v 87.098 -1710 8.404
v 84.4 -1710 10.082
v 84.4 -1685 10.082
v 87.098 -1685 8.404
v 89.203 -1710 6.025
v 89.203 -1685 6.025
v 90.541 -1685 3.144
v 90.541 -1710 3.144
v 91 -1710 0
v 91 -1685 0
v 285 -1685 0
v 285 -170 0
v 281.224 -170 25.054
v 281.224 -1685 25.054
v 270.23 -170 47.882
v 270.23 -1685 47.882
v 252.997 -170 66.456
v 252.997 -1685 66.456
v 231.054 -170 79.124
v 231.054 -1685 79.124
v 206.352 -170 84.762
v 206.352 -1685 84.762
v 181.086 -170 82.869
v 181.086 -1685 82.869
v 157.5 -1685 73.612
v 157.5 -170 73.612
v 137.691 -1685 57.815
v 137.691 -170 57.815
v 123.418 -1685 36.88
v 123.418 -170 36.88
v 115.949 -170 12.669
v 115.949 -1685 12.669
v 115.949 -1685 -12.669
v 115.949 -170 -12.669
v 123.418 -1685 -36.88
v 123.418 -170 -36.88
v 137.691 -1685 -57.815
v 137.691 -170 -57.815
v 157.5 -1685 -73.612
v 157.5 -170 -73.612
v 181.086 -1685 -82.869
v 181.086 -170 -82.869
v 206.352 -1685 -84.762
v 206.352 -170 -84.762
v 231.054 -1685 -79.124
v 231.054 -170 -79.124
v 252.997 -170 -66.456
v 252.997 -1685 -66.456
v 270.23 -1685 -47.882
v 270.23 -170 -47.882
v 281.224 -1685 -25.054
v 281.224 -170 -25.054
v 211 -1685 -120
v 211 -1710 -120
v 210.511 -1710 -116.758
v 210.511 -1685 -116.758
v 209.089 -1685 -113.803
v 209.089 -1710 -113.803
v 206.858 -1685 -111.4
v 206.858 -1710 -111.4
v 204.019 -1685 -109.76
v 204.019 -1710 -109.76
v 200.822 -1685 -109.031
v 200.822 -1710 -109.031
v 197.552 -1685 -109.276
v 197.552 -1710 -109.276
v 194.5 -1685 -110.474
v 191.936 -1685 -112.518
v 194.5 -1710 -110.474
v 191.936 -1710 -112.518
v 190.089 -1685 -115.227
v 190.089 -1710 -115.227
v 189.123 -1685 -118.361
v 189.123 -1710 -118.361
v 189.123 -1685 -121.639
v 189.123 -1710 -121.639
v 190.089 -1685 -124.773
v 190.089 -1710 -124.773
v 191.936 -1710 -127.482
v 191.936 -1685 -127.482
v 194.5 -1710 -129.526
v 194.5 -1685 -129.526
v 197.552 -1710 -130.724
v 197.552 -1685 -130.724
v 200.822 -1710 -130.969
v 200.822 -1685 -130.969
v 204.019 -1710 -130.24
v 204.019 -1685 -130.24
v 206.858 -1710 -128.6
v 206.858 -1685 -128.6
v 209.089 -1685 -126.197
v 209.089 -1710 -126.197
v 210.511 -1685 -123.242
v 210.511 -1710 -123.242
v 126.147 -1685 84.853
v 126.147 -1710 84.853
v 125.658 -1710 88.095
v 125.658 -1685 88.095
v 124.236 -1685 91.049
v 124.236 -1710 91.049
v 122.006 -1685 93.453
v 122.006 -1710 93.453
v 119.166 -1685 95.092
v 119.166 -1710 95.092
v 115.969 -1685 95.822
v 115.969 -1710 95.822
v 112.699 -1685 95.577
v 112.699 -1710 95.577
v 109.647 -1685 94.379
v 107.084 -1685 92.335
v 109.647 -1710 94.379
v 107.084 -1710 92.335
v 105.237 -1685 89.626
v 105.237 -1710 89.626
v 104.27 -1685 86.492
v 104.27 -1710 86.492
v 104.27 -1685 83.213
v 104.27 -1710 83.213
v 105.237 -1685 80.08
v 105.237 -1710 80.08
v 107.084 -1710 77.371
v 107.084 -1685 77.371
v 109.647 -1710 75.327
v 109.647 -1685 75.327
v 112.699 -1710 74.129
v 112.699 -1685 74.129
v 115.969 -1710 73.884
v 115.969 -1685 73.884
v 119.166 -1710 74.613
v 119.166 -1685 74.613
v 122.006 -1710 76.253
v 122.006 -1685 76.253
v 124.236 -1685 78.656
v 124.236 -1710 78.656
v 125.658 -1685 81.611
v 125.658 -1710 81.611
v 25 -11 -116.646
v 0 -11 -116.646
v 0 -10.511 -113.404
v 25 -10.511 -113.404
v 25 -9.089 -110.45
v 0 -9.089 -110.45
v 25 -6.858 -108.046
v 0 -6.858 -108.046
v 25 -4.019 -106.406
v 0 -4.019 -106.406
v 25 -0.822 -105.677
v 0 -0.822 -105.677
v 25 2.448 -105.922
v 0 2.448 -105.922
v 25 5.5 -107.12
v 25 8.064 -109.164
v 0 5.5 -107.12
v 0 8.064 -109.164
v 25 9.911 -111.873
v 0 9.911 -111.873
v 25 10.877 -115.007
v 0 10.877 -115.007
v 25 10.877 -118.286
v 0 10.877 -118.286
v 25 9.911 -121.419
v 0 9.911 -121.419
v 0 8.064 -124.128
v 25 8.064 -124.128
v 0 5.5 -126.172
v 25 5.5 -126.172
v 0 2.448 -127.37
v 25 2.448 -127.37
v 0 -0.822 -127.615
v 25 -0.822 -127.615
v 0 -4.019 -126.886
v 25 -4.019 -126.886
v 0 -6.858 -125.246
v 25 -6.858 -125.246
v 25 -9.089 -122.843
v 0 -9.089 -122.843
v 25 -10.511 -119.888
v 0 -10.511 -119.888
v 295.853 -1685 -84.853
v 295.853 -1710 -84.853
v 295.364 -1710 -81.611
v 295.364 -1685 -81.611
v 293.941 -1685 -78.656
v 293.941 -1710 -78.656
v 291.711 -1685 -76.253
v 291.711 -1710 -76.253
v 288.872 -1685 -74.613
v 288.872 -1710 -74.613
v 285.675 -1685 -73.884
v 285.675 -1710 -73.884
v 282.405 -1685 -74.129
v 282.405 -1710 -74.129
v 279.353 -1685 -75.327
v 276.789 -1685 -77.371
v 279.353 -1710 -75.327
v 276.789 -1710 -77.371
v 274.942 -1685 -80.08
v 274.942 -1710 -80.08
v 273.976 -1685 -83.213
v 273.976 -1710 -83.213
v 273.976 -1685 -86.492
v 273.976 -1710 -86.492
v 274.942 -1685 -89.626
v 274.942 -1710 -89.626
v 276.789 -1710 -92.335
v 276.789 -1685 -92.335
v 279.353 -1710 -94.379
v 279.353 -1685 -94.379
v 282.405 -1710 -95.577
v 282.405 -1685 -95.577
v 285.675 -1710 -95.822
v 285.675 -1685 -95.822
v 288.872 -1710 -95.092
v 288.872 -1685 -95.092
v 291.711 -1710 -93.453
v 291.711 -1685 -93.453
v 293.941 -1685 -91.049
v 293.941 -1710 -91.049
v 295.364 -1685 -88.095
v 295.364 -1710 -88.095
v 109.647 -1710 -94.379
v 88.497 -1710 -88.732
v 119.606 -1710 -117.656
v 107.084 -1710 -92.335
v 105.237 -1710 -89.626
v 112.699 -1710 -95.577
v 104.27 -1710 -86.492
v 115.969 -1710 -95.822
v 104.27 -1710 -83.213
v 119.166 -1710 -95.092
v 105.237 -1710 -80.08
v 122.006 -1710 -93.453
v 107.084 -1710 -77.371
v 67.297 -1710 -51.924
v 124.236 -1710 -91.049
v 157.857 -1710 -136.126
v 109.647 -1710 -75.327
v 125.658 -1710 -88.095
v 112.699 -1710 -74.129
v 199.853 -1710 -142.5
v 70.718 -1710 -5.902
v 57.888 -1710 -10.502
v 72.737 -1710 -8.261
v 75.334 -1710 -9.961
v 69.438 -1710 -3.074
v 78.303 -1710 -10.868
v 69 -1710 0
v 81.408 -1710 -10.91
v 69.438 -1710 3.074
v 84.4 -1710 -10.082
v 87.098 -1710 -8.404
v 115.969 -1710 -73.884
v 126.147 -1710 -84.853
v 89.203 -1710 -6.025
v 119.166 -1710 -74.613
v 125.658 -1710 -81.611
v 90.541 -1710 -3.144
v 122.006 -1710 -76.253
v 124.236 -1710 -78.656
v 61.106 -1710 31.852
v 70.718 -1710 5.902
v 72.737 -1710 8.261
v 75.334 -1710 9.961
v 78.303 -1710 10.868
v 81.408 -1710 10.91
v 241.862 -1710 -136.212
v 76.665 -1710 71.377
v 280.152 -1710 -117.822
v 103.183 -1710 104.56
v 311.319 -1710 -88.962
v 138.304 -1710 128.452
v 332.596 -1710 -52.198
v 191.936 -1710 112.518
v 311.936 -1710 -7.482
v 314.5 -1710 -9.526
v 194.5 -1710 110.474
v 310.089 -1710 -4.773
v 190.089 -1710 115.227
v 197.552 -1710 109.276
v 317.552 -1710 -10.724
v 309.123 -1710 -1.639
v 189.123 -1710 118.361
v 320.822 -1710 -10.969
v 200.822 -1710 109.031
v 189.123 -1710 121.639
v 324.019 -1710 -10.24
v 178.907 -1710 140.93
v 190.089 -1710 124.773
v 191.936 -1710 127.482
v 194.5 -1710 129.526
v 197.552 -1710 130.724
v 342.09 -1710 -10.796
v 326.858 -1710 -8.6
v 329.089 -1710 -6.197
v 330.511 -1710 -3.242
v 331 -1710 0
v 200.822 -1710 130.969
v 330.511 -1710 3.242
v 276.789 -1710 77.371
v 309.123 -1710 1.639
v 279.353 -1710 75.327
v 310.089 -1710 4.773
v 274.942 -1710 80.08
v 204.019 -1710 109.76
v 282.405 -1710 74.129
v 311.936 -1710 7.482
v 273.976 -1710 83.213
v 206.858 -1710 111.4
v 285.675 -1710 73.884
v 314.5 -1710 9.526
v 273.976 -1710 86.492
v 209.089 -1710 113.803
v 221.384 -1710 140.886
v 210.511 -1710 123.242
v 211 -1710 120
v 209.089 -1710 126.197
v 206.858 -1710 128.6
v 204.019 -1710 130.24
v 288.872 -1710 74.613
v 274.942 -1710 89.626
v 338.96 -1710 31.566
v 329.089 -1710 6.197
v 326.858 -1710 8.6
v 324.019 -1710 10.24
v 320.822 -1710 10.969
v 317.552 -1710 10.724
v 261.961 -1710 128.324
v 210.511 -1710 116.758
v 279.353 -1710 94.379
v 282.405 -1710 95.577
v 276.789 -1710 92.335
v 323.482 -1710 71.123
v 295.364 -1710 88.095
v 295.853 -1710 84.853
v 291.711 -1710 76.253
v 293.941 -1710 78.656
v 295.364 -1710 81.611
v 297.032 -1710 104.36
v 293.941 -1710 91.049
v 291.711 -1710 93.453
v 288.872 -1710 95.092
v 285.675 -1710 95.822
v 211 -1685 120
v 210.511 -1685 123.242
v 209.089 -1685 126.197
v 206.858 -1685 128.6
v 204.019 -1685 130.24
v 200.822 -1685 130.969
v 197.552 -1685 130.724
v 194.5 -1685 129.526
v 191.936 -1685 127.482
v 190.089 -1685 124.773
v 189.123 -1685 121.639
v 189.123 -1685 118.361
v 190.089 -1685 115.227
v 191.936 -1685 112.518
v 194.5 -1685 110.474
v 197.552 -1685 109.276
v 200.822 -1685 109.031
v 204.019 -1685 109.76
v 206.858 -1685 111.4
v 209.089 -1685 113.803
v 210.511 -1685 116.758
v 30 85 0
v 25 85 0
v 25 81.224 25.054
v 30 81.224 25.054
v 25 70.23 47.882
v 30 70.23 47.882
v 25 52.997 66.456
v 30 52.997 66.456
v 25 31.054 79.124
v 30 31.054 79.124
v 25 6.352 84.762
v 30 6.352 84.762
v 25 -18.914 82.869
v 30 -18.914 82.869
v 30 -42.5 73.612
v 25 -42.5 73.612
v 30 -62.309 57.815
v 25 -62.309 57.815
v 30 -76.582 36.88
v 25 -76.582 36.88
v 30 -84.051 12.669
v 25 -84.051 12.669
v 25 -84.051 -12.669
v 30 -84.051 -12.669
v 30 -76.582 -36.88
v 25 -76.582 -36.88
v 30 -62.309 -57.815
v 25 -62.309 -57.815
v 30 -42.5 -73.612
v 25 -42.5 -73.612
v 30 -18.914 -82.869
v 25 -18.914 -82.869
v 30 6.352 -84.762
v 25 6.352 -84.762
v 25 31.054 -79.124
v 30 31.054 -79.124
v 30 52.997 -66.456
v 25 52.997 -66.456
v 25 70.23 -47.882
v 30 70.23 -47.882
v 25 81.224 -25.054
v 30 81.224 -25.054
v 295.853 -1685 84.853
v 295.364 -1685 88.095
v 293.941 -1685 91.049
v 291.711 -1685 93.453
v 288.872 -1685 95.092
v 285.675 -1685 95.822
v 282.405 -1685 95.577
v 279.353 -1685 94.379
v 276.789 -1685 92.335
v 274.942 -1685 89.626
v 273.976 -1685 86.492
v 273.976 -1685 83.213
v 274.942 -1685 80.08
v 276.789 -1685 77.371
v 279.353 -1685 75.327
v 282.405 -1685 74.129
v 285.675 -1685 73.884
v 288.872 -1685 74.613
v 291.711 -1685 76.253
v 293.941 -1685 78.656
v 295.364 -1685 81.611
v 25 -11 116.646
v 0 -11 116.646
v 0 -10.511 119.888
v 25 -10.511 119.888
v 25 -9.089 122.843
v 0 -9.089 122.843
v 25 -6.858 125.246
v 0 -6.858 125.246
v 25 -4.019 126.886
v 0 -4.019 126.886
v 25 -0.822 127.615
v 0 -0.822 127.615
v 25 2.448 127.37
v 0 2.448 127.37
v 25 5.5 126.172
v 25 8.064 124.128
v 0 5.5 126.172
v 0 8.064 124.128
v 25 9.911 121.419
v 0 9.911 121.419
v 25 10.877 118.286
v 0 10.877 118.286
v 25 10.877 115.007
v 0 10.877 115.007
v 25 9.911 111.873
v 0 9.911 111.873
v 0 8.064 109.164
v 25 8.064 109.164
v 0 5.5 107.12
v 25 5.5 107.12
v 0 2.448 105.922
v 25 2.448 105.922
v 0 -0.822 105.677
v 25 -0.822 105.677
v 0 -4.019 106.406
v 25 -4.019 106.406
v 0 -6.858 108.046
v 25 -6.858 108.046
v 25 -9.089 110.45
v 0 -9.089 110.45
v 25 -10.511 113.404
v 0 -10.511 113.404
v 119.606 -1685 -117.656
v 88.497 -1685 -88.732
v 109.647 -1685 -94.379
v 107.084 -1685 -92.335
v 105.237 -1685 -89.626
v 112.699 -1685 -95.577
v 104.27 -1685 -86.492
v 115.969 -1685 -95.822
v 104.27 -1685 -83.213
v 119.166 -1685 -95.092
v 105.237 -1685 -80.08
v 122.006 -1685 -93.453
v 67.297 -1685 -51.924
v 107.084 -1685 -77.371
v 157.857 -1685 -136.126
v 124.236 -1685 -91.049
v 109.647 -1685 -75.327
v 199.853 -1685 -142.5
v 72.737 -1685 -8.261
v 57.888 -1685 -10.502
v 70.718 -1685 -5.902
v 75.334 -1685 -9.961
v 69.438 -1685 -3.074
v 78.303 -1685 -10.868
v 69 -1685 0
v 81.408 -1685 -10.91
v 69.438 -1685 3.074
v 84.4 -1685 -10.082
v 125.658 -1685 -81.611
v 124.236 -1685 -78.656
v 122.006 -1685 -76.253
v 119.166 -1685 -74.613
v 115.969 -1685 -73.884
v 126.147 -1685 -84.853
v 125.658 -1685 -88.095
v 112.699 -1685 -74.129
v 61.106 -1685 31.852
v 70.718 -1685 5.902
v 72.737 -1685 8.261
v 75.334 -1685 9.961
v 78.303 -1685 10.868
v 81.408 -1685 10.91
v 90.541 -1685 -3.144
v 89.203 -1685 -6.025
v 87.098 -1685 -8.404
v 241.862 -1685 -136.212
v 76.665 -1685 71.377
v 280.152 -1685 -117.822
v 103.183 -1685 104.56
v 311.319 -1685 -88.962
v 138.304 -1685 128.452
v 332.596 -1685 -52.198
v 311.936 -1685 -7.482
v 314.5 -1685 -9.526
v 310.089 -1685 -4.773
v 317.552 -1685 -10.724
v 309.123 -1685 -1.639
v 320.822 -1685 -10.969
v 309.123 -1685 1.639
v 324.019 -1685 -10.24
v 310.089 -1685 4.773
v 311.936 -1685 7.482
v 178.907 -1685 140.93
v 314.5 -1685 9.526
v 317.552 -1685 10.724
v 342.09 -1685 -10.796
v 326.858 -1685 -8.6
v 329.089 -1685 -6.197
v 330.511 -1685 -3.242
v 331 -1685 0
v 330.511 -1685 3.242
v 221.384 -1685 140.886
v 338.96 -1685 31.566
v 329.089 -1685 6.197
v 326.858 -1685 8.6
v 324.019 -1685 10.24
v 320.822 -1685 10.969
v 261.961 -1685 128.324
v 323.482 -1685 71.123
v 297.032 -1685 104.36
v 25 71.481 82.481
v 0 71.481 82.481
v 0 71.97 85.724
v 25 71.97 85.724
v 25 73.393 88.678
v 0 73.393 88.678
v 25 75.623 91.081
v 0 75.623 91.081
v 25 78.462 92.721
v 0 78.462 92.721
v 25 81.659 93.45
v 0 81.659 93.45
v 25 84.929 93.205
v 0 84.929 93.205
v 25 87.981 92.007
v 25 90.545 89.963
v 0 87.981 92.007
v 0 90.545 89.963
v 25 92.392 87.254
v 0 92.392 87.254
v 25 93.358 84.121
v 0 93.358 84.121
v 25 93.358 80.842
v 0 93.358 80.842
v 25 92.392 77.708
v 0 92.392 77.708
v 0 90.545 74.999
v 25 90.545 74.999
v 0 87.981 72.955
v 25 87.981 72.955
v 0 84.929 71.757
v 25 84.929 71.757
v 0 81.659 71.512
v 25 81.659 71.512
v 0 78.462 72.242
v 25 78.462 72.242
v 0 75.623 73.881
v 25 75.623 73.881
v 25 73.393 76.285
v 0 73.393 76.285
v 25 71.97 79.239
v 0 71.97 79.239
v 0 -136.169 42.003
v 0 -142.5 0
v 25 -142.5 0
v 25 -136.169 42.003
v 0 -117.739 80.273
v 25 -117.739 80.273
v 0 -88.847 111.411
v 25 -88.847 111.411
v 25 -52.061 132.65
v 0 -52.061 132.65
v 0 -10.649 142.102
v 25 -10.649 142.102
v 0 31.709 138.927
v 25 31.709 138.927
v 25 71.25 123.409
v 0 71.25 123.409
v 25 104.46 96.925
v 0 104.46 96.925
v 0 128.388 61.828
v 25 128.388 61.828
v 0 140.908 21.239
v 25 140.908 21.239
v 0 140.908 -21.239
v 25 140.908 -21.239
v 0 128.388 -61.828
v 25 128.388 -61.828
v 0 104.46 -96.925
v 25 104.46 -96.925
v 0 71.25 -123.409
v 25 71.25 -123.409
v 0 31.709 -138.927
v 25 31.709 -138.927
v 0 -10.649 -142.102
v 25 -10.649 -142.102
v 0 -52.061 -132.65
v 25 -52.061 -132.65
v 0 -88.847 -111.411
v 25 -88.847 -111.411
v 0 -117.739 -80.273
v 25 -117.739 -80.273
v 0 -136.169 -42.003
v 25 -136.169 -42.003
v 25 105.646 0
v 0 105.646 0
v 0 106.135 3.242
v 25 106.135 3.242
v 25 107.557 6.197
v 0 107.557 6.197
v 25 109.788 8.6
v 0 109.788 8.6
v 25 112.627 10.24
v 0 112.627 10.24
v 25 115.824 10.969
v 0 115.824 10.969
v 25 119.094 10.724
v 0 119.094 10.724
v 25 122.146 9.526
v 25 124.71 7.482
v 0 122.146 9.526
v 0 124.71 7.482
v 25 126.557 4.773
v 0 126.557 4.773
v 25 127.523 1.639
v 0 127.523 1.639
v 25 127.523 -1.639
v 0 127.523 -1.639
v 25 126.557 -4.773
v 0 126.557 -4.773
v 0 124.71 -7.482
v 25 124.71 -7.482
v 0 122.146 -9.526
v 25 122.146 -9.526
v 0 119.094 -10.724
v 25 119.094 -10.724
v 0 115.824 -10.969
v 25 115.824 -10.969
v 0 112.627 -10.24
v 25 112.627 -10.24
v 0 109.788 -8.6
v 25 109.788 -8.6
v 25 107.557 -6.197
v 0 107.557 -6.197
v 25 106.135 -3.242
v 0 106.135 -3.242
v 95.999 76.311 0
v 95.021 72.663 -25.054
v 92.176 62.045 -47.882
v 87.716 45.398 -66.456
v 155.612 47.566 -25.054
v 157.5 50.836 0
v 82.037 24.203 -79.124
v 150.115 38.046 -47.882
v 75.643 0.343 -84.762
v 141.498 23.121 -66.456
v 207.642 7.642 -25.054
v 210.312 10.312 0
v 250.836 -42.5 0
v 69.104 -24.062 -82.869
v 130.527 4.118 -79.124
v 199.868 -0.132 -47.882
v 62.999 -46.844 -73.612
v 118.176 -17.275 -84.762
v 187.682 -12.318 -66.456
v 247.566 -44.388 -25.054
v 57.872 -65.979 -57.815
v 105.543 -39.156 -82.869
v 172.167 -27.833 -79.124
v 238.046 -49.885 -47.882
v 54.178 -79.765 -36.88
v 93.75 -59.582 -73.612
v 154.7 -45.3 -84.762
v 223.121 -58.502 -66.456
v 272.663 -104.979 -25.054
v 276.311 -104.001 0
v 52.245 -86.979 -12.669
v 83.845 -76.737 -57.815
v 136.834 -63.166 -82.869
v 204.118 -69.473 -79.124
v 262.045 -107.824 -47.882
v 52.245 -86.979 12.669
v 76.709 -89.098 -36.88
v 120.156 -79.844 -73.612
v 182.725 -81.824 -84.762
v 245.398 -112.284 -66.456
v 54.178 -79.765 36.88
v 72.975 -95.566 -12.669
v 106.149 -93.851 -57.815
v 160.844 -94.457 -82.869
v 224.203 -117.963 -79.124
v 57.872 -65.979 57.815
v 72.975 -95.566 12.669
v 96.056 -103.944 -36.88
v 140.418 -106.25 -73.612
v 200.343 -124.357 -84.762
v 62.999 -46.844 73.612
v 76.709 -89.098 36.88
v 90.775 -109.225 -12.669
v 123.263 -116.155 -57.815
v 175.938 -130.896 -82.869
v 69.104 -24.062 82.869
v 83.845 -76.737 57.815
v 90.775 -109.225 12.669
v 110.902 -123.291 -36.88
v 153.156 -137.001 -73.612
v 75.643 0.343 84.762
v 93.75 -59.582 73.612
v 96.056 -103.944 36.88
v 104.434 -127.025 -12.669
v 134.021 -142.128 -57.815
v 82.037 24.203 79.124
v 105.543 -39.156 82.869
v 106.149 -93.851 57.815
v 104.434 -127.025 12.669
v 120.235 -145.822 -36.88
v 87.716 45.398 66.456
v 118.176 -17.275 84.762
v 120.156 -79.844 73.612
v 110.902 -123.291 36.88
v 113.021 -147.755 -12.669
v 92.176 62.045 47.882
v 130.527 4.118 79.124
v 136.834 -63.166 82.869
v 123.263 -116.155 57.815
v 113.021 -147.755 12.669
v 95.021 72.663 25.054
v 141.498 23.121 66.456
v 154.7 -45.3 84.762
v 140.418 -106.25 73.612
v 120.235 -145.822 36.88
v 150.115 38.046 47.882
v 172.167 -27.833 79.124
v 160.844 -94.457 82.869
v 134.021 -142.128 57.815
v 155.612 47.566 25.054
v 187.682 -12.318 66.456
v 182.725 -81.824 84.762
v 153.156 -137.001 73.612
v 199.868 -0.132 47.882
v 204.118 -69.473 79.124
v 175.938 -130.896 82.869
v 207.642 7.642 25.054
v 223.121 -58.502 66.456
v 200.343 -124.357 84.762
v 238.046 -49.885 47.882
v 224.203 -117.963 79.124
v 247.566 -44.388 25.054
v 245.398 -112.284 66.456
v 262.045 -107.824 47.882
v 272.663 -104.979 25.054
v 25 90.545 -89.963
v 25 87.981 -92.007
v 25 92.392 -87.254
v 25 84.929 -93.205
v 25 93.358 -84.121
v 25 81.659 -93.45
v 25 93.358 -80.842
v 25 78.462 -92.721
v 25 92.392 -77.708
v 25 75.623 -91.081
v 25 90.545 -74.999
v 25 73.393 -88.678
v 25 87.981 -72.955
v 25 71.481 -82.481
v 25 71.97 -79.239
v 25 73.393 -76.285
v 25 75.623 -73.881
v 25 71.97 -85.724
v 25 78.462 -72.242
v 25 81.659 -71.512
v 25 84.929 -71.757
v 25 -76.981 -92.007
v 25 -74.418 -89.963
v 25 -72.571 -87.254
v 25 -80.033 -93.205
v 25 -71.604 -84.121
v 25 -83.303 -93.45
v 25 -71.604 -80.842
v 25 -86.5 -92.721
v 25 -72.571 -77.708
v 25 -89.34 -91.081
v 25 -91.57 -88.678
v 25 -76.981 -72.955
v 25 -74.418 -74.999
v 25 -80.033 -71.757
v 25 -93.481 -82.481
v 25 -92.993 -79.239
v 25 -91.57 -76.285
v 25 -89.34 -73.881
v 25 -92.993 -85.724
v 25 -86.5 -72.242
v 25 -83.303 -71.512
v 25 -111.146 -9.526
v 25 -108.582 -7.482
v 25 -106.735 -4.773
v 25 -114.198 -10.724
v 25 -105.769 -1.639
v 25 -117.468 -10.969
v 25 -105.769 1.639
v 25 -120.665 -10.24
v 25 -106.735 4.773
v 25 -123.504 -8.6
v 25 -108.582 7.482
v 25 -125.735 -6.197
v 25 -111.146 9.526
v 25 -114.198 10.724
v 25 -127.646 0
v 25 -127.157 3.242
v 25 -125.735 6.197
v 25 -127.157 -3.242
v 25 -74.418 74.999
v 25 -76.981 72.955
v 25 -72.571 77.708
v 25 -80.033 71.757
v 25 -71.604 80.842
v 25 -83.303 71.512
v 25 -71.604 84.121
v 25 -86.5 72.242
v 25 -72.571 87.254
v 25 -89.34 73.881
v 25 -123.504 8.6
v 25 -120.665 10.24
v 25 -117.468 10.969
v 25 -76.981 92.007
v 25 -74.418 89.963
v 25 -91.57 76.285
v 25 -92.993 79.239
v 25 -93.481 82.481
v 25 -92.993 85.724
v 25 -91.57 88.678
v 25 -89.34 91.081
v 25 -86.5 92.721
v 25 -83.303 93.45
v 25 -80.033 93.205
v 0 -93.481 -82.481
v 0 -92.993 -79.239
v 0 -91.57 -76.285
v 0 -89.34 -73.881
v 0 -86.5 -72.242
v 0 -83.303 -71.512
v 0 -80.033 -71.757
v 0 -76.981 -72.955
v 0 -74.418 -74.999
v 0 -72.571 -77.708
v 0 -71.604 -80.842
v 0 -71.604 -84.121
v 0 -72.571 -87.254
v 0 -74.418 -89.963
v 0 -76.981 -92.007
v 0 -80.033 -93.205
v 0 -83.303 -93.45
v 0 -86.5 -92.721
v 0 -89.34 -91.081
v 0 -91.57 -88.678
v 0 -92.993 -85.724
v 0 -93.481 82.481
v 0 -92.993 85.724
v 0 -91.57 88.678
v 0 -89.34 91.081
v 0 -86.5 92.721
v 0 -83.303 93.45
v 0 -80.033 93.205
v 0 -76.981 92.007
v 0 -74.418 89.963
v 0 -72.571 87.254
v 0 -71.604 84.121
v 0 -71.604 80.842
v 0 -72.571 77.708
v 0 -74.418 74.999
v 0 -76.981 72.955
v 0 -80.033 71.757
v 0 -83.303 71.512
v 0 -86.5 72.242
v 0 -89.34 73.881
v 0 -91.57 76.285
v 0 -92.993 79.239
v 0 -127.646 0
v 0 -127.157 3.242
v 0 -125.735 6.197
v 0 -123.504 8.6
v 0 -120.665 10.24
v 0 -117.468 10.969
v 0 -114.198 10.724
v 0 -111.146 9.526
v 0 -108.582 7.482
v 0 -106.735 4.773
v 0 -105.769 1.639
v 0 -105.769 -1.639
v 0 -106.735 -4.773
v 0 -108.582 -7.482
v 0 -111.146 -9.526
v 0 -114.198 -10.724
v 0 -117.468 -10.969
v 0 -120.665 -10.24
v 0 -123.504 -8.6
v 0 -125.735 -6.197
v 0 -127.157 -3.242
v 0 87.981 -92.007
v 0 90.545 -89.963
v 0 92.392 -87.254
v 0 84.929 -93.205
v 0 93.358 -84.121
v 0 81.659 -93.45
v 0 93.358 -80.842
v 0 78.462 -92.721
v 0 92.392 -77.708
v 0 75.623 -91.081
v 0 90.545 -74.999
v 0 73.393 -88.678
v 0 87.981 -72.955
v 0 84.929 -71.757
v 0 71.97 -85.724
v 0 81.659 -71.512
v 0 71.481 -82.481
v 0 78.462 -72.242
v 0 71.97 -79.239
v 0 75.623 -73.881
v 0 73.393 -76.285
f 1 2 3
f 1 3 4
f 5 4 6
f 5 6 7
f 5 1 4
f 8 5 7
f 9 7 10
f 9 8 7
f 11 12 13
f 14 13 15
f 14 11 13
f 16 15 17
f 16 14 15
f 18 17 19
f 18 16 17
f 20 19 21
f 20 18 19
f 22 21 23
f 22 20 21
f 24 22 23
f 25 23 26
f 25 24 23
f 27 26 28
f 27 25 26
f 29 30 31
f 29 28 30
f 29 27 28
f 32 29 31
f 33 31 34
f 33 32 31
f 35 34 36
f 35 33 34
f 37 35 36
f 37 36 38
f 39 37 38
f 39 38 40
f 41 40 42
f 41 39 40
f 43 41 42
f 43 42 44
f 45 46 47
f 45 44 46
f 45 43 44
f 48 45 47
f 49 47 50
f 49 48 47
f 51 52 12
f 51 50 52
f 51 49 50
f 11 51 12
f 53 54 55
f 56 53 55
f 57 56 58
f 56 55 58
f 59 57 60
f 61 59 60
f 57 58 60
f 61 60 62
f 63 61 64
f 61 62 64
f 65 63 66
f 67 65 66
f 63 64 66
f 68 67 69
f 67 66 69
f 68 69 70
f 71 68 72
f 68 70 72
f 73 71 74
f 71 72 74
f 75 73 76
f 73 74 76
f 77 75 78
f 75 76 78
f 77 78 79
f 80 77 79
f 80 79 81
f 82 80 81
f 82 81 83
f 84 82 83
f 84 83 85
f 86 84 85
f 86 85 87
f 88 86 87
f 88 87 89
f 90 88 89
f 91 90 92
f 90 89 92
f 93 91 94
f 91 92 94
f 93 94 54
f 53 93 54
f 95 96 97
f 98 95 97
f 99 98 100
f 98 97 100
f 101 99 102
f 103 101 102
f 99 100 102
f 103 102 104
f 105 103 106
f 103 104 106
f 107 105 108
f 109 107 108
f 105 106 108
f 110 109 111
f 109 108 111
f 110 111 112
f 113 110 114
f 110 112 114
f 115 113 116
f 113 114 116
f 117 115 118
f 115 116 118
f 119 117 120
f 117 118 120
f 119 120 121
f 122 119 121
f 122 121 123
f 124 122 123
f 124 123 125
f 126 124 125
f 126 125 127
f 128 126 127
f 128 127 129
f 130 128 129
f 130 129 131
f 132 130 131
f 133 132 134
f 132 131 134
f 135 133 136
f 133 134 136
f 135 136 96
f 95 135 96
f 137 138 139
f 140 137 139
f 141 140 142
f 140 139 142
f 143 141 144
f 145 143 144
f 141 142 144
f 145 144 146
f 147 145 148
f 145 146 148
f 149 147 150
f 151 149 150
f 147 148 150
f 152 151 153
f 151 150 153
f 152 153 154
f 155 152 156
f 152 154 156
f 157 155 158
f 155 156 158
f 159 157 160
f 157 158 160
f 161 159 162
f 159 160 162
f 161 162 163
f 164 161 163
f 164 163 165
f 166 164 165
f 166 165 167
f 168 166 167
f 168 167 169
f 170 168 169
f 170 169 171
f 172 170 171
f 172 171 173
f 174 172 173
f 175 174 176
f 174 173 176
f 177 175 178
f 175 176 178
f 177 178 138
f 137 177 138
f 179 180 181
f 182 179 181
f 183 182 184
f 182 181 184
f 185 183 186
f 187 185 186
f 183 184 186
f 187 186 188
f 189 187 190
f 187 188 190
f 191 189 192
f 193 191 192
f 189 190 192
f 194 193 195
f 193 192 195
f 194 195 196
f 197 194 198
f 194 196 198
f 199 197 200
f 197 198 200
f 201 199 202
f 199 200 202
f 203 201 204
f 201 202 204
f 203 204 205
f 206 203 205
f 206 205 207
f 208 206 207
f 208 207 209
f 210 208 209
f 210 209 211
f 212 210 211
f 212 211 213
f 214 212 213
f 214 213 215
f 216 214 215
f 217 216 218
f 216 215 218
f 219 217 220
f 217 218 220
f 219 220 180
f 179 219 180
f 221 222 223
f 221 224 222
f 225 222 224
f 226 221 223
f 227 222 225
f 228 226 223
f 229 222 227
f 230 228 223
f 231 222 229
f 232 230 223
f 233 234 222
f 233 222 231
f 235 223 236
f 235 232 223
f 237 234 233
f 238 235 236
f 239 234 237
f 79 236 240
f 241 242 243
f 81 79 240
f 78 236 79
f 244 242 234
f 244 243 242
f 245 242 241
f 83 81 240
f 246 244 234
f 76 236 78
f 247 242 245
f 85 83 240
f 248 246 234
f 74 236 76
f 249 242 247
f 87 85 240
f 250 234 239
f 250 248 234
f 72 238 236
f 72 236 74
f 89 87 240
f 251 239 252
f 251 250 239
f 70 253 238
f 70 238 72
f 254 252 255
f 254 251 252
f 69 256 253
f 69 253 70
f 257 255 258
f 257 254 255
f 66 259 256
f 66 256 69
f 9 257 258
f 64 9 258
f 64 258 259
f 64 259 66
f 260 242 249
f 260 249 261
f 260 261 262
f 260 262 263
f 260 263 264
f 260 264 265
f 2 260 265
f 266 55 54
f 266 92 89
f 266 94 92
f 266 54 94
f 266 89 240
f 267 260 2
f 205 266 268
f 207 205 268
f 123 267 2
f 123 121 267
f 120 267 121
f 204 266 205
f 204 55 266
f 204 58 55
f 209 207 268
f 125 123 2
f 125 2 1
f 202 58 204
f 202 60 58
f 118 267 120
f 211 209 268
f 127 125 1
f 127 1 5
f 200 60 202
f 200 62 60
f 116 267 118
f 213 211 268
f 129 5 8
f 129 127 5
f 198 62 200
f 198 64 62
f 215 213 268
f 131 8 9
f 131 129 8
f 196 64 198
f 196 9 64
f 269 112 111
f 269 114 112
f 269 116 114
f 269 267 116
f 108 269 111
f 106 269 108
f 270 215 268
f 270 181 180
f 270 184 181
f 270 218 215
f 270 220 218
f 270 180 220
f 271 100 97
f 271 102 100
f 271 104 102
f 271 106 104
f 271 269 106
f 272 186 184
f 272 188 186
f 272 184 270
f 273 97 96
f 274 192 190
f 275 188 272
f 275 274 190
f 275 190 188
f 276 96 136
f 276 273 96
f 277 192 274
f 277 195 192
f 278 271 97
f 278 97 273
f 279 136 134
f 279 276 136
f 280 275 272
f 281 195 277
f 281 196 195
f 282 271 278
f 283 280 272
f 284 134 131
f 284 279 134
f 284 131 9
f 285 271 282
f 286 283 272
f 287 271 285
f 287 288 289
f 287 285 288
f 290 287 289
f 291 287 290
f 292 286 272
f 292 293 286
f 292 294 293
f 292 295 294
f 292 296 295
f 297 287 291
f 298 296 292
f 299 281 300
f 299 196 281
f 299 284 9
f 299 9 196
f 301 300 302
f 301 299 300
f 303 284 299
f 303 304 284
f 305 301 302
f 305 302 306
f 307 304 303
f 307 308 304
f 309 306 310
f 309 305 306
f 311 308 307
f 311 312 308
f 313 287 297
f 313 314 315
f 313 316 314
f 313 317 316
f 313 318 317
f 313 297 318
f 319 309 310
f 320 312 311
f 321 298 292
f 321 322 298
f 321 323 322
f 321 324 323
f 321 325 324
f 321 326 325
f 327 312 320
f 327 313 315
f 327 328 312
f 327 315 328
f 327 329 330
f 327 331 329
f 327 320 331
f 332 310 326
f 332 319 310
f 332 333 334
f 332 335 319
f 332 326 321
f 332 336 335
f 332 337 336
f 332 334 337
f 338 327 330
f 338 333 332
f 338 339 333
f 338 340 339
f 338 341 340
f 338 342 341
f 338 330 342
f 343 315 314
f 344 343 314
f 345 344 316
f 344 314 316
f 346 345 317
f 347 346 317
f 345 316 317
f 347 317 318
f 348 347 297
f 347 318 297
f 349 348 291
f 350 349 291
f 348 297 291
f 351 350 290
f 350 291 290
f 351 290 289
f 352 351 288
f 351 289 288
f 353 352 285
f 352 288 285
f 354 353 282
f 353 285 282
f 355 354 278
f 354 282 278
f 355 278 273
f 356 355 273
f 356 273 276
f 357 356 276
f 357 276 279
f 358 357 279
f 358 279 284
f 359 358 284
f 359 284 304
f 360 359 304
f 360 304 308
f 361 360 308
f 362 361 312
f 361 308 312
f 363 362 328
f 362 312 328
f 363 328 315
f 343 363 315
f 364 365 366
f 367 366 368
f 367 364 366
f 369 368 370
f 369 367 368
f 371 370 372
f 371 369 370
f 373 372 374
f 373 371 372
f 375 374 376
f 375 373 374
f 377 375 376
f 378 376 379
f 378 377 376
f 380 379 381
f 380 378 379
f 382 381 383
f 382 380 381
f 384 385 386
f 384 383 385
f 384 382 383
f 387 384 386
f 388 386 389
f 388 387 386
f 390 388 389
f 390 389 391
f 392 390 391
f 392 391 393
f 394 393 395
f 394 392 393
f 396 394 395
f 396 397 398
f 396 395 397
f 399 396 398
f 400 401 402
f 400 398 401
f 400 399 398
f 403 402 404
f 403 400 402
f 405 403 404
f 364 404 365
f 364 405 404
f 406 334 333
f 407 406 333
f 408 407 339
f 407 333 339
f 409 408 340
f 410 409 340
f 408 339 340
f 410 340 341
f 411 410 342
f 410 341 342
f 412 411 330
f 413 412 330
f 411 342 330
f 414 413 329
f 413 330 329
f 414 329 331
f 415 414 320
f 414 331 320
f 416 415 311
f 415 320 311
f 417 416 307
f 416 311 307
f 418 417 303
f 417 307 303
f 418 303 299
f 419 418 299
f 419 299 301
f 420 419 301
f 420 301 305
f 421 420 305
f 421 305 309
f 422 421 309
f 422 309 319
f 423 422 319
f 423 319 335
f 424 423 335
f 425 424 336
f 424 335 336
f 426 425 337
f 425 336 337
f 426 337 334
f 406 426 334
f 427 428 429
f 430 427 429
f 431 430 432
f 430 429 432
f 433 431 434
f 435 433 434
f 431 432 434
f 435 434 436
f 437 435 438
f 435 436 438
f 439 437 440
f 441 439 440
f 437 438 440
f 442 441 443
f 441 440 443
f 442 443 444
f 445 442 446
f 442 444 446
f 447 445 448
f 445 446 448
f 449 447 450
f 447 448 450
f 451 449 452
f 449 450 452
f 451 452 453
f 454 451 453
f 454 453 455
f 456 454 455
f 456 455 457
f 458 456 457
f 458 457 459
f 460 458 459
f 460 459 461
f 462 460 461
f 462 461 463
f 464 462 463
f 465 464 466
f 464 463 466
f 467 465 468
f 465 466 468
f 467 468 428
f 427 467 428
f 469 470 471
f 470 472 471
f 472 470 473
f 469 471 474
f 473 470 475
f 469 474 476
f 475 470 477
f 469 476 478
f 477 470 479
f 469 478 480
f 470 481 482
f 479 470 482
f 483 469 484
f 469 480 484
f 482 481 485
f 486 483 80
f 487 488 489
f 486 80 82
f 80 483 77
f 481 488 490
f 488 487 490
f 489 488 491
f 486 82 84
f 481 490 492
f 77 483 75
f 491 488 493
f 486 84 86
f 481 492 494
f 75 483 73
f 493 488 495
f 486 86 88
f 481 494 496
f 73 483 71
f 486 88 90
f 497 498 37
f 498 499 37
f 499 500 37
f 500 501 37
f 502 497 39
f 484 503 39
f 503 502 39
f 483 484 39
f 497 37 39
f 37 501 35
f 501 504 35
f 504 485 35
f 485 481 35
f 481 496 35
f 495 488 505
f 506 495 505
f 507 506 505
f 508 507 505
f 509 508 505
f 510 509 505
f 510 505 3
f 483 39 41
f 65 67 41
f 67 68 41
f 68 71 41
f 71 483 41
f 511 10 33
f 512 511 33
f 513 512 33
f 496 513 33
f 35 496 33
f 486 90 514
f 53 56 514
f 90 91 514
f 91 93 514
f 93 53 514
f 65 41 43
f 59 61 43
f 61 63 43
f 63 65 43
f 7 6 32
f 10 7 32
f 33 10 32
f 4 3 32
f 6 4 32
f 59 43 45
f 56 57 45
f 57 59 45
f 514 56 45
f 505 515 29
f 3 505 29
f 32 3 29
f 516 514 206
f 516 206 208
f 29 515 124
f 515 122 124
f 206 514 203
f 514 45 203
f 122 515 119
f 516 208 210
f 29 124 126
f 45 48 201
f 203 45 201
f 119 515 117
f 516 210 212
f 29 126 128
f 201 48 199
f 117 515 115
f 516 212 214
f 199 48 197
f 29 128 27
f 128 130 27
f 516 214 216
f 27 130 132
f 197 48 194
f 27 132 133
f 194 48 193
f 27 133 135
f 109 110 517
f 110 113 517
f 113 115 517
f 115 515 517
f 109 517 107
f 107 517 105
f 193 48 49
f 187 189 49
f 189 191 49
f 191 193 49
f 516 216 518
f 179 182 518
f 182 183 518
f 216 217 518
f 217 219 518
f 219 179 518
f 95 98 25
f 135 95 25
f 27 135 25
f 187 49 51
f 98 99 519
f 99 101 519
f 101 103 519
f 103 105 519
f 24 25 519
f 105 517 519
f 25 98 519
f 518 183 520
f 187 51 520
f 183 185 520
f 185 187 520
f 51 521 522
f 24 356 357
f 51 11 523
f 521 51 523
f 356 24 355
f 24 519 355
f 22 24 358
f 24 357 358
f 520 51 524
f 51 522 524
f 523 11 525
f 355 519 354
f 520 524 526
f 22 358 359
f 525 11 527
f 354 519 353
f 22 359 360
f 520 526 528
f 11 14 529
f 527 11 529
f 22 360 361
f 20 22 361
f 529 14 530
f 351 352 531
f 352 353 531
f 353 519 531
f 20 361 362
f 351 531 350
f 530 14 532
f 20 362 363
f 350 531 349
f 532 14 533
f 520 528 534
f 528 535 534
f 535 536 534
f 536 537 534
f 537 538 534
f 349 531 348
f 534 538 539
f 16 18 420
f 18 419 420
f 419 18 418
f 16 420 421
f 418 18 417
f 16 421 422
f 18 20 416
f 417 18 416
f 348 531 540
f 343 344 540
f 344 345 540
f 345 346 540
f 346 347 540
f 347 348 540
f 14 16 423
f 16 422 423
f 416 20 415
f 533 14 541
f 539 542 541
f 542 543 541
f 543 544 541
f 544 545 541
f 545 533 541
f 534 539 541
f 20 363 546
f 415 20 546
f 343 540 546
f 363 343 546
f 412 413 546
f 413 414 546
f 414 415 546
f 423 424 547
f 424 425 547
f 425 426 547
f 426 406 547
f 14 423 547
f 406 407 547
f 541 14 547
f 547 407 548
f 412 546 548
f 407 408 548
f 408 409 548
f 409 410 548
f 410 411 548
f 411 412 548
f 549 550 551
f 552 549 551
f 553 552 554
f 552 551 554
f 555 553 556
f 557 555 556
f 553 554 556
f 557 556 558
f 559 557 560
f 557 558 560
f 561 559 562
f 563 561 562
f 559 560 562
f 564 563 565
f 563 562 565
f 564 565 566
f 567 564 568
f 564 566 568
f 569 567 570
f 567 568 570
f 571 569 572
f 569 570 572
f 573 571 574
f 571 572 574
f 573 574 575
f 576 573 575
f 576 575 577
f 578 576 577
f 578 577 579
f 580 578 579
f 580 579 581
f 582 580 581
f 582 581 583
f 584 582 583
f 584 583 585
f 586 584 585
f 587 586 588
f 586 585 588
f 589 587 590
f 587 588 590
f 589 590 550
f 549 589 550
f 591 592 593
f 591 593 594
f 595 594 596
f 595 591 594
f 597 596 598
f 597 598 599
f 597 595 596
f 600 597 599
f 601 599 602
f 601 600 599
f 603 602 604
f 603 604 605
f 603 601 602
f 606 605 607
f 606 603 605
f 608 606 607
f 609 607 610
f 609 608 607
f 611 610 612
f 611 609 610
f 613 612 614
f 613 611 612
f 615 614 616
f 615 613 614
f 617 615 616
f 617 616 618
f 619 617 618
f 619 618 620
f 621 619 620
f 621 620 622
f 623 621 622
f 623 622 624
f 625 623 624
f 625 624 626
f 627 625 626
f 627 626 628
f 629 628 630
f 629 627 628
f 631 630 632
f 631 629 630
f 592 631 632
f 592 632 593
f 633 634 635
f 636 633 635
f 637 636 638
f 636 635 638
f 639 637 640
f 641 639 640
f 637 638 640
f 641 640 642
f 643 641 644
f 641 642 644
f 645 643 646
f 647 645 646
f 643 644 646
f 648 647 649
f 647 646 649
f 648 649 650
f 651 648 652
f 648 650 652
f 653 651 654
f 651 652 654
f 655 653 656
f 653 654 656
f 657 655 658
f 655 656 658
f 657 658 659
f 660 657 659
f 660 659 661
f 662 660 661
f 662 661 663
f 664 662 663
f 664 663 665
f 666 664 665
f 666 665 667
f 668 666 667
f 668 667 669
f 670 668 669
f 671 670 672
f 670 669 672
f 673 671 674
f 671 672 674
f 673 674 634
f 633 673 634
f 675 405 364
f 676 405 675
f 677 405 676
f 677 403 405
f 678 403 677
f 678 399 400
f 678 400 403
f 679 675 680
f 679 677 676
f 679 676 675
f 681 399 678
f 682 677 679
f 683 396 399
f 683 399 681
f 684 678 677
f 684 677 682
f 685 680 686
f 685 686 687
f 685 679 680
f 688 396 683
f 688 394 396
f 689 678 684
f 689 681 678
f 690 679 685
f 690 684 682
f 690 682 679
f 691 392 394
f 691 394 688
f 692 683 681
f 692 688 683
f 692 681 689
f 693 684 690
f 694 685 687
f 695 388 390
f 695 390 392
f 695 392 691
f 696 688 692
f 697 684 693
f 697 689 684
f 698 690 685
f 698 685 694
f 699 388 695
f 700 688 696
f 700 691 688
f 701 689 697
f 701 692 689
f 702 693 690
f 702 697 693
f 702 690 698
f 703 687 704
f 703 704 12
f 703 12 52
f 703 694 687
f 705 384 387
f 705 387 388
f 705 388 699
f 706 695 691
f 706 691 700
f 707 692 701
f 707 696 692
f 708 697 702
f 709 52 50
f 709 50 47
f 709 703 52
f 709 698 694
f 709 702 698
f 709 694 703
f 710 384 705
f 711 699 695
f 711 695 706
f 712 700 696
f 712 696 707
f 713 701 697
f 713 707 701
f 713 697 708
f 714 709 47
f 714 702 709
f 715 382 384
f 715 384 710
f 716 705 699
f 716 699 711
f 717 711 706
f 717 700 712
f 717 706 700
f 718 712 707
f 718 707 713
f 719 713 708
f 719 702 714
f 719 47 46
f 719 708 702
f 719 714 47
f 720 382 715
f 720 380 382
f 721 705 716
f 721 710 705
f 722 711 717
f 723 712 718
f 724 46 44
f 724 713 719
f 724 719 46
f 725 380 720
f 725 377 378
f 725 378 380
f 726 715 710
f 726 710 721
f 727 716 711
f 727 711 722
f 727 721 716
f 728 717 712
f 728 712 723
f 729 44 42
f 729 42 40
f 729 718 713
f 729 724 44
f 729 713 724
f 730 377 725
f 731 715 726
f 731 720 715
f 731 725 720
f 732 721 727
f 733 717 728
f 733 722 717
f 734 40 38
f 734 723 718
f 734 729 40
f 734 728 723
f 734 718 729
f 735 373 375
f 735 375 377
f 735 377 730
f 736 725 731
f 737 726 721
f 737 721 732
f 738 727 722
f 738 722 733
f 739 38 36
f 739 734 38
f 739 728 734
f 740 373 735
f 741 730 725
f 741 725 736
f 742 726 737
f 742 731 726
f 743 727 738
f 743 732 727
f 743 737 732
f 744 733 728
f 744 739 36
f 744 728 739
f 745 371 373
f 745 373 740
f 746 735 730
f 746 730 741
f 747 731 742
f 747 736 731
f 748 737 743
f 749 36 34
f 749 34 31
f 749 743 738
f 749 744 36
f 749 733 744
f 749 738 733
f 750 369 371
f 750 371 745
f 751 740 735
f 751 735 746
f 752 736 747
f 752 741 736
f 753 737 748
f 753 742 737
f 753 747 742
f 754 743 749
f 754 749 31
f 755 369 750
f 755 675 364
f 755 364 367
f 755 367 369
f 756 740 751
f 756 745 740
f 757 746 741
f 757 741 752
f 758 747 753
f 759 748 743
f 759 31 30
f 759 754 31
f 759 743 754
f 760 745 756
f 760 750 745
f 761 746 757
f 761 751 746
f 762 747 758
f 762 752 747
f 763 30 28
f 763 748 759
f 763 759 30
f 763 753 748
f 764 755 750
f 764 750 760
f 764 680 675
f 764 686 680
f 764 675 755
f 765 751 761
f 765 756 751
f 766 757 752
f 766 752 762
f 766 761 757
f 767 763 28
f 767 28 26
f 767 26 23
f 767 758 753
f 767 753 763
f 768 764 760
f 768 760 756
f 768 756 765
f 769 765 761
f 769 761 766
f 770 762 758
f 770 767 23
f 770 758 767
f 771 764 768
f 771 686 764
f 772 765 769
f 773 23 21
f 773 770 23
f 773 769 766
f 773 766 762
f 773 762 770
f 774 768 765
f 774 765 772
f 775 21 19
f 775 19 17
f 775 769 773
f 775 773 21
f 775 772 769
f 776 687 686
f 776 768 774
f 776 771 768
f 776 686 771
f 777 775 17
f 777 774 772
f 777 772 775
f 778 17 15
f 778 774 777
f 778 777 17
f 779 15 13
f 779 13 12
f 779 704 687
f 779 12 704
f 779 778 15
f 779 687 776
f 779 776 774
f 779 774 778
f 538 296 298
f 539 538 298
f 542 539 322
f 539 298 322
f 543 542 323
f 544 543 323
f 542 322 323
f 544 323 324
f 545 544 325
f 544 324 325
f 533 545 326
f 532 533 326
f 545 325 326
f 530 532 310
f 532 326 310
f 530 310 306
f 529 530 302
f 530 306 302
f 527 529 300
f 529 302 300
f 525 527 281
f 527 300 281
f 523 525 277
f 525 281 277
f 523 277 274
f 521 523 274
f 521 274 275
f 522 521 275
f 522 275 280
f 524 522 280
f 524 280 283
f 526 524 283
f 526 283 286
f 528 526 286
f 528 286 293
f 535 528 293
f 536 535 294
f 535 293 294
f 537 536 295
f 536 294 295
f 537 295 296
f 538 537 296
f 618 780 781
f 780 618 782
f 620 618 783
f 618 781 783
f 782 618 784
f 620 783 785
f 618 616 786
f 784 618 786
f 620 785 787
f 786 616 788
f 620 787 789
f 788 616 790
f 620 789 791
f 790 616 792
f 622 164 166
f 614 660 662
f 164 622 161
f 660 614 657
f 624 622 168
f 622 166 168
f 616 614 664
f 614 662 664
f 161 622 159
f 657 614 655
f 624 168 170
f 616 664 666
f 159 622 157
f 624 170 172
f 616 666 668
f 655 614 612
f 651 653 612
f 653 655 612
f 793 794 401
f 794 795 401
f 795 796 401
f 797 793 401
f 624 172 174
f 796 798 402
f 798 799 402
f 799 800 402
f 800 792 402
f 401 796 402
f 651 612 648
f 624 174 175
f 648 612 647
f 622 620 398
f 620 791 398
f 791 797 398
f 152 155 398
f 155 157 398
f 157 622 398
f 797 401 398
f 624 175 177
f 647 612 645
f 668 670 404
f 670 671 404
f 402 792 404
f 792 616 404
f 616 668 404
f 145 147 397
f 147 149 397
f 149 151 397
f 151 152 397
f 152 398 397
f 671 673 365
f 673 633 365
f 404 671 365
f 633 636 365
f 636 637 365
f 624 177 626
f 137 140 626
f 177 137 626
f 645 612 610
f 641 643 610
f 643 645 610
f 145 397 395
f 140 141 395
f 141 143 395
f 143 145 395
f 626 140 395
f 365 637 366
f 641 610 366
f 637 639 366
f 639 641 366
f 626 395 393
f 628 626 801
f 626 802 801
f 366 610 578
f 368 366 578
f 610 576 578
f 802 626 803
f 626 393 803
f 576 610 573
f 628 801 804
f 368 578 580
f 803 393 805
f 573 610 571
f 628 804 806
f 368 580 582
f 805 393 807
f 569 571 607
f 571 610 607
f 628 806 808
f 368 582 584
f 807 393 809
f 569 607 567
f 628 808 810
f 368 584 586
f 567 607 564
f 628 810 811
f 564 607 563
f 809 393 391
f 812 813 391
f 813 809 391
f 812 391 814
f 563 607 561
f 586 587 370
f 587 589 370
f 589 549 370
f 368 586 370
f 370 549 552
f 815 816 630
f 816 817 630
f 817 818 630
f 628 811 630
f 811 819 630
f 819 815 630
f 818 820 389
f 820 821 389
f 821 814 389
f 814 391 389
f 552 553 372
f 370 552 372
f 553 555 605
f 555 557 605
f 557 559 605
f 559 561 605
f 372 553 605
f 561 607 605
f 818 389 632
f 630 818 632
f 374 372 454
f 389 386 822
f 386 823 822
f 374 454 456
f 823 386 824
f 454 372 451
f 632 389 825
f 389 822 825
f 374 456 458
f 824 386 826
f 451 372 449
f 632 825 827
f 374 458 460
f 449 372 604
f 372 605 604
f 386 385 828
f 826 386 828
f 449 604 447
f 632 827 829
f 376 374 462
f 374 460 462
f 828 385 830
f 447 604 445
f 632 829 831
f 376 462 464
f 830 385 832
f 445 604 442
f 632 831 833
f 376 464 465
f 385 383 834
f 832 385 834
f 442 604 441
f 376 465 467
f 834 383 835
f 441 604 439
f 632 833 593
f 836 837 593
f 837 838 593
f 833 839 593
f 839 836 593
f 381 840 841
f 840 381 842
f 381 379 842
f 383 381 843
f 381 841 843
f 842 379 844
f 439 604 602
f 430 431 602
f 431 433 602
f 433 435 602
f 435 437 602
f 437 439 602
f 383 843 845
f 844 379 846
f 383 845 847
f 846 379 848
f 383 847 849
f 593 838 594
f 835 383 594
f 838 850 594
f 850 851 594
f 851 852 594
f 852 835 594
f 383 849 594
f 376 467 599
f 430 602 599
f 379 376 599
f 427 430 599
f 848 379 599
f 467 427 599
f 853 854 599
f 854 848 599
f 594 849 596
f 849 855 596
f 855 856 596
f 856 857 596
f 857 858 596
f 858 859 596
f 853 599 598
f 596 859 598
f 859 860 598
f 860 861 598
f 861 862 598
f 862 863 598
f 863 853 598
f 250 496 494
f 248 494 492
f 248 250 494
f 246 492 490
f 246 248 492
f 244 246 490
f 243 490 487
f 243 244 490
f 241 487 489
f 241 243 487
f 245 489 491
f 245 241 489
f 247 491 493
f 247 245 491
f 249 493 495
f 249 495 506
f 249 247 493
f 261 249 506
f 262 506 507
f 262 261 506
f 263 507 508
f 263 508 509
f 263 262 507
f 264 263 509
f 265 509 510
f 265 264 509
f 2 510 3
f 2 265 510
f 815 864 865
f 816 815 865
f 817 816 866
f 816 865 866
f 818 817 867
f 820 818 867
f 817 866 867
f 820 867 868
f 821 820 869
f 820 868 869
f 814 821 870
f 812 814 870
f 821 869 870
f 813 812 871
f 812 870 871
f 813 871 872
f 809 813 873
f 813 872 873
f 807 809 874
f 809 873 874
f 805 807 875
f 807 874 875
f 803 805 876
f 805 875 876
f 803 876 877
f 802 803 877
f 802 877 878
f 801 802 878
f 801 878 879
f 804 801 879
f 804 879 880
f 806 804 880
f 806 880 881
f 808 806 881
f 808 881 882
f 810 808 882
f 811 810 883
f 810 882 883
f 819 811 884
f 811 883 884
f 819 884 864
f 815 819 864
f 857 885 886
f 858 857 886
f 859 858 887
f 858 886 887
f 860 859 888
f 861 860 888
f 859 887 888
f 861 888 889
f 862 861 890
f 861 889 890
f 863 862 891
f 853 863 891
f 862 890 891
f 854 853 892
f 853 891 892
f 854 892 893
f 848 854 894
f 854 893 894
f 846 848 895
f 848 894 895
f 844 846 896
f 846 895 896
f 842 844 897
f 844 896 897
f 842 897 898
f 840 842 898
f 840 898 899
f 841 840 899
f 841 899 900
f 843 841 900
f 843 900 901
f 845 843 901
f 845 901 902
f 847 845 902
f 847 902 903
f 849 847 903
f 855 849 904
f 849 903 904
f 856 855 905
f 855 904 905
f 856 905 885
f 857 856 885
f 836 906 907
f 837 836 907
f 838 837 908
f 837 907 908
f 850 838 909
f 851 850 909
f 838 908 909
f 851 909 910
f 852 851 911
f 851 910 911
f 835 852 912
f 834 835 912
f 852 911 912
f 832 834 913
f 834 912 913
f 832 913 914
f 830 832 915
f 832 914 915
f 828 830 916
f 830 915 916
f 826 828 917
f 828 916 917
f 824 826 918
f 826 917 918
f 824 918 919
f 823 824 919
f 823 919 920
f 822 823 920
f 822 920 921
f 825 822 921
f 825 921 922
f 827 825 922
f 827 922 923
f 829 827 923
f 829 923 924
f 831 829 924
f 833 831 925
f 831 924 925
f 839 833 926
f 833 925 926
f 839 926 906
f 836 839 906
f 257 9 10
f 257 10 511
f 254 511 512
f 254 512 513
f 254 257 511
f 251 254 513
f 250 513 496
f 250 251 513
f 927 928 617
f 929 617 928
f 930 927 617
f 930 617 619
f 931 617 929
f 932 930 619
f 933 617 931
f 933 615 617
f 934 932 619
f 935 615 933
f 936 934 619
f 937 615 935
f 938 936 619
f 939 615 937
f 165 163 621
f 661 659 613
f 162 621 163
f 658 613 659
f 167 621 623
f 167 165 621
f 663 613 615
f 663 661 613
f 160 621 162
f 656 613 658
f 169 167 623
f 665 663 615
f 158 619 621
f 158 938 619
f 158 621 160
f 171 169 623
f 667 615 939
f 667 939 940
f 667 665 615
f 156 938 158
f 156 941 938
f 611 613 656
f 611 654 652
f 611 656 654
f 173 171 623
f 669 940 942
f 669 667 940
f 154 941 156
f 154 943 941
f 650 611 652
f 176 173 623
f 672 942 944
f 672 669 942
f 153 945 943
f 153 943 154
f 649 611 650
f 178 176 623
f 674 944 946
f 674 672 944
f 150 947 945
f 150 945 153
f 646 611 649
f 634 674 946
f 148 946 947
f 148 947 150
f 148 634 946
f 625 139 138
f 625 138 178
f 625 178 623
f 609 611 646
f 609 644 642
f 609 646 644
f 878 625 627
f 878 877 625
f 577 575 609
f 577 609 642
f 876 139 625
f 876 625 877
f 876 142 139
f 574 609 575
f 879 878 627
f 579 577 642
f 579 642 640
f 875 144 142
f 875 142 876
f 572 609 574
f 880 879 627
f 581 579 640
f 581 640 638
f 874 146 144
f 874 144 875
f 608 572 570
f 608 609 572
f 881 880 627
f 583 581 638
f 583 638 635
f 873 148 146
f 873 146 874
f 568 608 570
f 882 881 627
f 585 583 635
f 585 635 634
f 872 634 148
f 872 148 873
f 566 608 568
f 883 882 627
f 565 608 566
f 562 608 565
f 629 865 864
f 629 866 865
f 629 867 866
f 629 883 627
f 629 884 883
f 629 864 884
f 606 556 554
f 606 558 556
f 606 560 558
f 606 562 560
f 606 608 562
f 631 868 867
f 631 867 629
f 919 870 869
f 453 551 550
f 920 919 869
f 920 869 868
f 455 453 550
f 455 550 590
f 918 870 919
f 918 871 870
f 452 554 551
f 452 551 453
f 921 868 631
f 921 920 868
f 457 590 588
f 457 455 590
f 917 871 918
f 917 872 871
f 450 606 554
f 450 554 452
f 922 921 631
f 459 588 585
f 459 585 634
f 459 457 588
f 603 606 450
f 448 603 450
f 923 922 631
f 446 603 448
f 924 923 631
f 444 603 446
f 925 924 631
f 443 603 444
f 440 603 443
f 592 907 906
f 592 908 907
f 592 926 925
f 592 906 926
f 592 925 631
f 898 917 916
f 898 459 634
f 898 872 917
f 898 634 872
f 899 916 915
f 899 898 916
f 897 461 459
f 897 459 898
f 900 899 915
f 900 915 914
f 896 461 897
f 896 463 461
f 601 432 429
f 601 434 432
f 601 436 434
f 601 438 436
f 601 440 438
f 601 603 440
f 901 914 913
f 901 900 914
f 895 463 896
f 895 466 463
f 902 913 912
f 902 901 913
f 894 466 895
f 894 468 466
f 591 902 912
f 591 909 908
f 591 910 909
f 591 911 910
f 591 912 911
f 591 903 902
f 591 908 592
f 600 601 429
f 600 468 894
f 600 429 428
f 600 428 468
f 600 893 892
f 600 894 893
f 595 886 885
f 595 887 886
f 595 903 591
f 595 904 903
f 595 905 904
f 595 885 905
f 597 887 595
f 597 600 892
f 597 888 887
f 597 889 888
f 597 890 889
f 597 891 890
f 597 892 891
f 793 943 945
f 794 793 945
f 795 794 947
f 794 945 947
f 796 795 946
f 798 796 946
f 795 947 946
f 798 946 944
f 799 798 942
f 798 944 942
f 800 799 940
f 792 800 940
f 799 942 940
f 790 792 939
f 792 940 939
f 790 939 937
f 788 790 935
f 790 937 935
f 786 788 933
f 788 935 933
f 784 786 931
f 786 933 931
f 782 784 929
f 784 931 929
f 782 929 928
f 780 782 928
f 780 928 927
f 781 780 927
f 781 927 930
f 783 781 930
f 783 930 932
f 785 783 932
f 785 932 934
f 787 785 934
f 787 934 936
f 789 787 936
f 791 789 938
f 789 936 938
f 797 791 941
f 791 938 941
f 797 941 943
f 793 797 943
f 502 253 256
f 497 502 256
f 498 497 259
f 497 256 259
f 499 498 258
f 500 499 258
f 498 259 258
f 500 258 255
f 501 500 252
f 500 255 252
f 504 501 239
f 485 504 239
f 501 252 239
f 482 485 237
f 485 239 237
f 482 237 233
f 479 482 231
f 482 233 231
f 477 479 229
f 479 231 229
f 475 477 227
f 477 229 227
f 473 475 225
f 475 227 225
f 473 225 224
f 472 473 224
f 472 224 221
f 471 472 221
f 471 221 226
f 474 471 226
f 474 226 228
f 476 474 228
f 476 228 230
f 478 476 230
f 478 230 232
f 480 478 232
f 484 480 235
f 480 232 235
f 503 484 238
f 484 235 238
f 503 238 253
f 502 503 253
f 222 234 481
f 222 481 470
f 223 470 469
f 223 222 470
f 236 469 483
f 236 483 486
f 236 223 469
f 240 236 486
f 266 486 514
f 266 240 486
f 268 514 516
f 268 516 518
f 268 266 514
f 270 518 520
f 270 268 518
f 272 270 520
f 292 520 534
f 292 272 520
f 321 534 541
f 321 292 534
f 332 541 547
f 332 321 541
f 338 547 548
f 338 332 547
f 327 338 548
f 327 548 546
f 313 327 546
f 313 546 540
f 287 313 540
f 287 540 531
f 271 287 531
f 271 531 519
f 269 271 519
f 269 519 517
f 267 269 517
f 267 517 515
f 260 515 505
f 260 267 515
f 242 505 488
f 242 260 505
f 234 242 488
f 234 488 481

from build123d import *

# Parameters (mm, degrees)
F0_R     = 85
F5_R     = 11
F6_DEPTH = 25
F7_R     = 142.5
F7_R_2   = 11
F7_R_3   = 85
F8_DEPTH = 25


with BuildPart() as f4:
    # F4: sweep along a path in F4_path
    with BuildLine(Plane(origin=(0, 0, 0), x_dir=(0, 1, 0), z_dir=(0, 0, 1))) as f4_path:
        Line((0, 0), (0, -30))
        ThreePointArc((0, -30), (-49.7918471983, -150.2081528017), (-170, -200))
        Line((-170, -200), (-1710, -200))
    # F0 (on Right) → F4 (sweep)
    with BuildSketch(Plane.YZ):
        Circle(F0_R)
    sweep(path=f4_path.line)

    # F5 (on face) → F6 (join)
    with BuildSketch(Plane.XZ.offset(1710)):
        with BuildLine():
            ThreePointArc((84.4, 10.0816665289), (78.6809157211, 32.1607447254), (67.296875, 51.9242777055))
            ThreePointArc((67.296875, 51.9242777055), (57.5, 0), (67.296875, -51.9242777055))
            ThreePointArc((67.296875, -51.9242777055), (78.6809157211, -32.1607447254), (84.4, -10.0816665289))
            ThreePointArc((84.4, -10.0816665289), (69, 0), (84.4, 10.0816665289))
        make_face()
        with BuildLine():
            ThreePointArc((67.296875, -51.9242777055), (226.4202071103, -140.0293635501), (342.5, 0))
            ThreePointArc((342.5, 0), (226.4202071103, 140.0293635501), (67.296875, 51.9242777055))
            ThreePointArc((67.296875, 51.9242777055), (78.6809157211, 32.1607447254), (84.4, 10.0816665289))
            ThreePointArc((84.4, 10.0816665289), (89.2032602919, 6.0249481326), (91, 0))
            ThreePointArc((91, 0), (89.2032602919, -6.0249481326), (84.4, -10.0816665289))
            ThreePointArc((84.4, -10.0816665289), (78.6809157211, -32.1607447254), (67.296875, -51.9242777055))
        make_face()
        with Locations((115.1471862576, -84.8528137424)):
            Circle(F5_R, mode=Mode.SUBTRACT)
        with Locations((200, -120)):
            Circle(F5_R, mode=Mode.SUBTRACT)
        with Locations((284.8528137424, -84.8528137424)):
            Circle(F5_R, mode=Mode.SUBTRACT)
        with Locations((115.1471862576, 84.8528137424)):
            Circle(F5_R, mode=Mode.SUBTRACT)
        with Locations((320, 0)):
            Circle(F5_R, mode=Mode.SUBTRACT)
        with Locations((200, 120)):
            Circle(F5_R, mode=Mode.SUBTRACT)
        with Locations((284.8528137424, 84.8528137424)):
            Circle(F5_R, mode=Mode.SUBTRACT)
    extrude(amount=-F6_DEPTH)

    # F7 (on face) → F8 (join)
    with BuildSketch(Plane(origin=(0, 0, 0), x_dir=(0, -1, 0), z_dir=(-1, 0, 0))):
        Circle(F7_R)
        with Locations((-82.4812086801, -82.4812086801)):
            Circle(F7_R_2, mode=Mode.SUBTRACT)
        with Locations((0, -116.6460439563)):
            Circle(F7_R_2, mode=Mode.SUBTRACT)
        with Locations((82.4812086801, -82.4812086801)):
            Circle(F7_R_2, mode=Mode.SUBTRACT)
        with Locations((-116.6460439563, 0)):
            Circle(F7_R_2, mode=Mode.SUBTRACT)
        with Locations((-82.4812086801, 82.4812086801)):
            Circle(F7_R_2, mode=Mode.SUBTRACT)
        Circle(F7_R_3, mode=Mode.SUBTRACT)
        with Locations((116.6460439563, 0)):
            Circle(F7_R_2, mode=Mode.SUBTRACT)
        with Locations((0, 116.6460439563)):
            Circle(F7_R_2, mode=Mode.SUBTRACT)
        with Locations((82.4812086801, 82.4812086801)):
            Circle(F7_R_2, mode=Mode.SUBTRACT)
    extrude(amount=-F8_DEPTH)


solid = f4.part
